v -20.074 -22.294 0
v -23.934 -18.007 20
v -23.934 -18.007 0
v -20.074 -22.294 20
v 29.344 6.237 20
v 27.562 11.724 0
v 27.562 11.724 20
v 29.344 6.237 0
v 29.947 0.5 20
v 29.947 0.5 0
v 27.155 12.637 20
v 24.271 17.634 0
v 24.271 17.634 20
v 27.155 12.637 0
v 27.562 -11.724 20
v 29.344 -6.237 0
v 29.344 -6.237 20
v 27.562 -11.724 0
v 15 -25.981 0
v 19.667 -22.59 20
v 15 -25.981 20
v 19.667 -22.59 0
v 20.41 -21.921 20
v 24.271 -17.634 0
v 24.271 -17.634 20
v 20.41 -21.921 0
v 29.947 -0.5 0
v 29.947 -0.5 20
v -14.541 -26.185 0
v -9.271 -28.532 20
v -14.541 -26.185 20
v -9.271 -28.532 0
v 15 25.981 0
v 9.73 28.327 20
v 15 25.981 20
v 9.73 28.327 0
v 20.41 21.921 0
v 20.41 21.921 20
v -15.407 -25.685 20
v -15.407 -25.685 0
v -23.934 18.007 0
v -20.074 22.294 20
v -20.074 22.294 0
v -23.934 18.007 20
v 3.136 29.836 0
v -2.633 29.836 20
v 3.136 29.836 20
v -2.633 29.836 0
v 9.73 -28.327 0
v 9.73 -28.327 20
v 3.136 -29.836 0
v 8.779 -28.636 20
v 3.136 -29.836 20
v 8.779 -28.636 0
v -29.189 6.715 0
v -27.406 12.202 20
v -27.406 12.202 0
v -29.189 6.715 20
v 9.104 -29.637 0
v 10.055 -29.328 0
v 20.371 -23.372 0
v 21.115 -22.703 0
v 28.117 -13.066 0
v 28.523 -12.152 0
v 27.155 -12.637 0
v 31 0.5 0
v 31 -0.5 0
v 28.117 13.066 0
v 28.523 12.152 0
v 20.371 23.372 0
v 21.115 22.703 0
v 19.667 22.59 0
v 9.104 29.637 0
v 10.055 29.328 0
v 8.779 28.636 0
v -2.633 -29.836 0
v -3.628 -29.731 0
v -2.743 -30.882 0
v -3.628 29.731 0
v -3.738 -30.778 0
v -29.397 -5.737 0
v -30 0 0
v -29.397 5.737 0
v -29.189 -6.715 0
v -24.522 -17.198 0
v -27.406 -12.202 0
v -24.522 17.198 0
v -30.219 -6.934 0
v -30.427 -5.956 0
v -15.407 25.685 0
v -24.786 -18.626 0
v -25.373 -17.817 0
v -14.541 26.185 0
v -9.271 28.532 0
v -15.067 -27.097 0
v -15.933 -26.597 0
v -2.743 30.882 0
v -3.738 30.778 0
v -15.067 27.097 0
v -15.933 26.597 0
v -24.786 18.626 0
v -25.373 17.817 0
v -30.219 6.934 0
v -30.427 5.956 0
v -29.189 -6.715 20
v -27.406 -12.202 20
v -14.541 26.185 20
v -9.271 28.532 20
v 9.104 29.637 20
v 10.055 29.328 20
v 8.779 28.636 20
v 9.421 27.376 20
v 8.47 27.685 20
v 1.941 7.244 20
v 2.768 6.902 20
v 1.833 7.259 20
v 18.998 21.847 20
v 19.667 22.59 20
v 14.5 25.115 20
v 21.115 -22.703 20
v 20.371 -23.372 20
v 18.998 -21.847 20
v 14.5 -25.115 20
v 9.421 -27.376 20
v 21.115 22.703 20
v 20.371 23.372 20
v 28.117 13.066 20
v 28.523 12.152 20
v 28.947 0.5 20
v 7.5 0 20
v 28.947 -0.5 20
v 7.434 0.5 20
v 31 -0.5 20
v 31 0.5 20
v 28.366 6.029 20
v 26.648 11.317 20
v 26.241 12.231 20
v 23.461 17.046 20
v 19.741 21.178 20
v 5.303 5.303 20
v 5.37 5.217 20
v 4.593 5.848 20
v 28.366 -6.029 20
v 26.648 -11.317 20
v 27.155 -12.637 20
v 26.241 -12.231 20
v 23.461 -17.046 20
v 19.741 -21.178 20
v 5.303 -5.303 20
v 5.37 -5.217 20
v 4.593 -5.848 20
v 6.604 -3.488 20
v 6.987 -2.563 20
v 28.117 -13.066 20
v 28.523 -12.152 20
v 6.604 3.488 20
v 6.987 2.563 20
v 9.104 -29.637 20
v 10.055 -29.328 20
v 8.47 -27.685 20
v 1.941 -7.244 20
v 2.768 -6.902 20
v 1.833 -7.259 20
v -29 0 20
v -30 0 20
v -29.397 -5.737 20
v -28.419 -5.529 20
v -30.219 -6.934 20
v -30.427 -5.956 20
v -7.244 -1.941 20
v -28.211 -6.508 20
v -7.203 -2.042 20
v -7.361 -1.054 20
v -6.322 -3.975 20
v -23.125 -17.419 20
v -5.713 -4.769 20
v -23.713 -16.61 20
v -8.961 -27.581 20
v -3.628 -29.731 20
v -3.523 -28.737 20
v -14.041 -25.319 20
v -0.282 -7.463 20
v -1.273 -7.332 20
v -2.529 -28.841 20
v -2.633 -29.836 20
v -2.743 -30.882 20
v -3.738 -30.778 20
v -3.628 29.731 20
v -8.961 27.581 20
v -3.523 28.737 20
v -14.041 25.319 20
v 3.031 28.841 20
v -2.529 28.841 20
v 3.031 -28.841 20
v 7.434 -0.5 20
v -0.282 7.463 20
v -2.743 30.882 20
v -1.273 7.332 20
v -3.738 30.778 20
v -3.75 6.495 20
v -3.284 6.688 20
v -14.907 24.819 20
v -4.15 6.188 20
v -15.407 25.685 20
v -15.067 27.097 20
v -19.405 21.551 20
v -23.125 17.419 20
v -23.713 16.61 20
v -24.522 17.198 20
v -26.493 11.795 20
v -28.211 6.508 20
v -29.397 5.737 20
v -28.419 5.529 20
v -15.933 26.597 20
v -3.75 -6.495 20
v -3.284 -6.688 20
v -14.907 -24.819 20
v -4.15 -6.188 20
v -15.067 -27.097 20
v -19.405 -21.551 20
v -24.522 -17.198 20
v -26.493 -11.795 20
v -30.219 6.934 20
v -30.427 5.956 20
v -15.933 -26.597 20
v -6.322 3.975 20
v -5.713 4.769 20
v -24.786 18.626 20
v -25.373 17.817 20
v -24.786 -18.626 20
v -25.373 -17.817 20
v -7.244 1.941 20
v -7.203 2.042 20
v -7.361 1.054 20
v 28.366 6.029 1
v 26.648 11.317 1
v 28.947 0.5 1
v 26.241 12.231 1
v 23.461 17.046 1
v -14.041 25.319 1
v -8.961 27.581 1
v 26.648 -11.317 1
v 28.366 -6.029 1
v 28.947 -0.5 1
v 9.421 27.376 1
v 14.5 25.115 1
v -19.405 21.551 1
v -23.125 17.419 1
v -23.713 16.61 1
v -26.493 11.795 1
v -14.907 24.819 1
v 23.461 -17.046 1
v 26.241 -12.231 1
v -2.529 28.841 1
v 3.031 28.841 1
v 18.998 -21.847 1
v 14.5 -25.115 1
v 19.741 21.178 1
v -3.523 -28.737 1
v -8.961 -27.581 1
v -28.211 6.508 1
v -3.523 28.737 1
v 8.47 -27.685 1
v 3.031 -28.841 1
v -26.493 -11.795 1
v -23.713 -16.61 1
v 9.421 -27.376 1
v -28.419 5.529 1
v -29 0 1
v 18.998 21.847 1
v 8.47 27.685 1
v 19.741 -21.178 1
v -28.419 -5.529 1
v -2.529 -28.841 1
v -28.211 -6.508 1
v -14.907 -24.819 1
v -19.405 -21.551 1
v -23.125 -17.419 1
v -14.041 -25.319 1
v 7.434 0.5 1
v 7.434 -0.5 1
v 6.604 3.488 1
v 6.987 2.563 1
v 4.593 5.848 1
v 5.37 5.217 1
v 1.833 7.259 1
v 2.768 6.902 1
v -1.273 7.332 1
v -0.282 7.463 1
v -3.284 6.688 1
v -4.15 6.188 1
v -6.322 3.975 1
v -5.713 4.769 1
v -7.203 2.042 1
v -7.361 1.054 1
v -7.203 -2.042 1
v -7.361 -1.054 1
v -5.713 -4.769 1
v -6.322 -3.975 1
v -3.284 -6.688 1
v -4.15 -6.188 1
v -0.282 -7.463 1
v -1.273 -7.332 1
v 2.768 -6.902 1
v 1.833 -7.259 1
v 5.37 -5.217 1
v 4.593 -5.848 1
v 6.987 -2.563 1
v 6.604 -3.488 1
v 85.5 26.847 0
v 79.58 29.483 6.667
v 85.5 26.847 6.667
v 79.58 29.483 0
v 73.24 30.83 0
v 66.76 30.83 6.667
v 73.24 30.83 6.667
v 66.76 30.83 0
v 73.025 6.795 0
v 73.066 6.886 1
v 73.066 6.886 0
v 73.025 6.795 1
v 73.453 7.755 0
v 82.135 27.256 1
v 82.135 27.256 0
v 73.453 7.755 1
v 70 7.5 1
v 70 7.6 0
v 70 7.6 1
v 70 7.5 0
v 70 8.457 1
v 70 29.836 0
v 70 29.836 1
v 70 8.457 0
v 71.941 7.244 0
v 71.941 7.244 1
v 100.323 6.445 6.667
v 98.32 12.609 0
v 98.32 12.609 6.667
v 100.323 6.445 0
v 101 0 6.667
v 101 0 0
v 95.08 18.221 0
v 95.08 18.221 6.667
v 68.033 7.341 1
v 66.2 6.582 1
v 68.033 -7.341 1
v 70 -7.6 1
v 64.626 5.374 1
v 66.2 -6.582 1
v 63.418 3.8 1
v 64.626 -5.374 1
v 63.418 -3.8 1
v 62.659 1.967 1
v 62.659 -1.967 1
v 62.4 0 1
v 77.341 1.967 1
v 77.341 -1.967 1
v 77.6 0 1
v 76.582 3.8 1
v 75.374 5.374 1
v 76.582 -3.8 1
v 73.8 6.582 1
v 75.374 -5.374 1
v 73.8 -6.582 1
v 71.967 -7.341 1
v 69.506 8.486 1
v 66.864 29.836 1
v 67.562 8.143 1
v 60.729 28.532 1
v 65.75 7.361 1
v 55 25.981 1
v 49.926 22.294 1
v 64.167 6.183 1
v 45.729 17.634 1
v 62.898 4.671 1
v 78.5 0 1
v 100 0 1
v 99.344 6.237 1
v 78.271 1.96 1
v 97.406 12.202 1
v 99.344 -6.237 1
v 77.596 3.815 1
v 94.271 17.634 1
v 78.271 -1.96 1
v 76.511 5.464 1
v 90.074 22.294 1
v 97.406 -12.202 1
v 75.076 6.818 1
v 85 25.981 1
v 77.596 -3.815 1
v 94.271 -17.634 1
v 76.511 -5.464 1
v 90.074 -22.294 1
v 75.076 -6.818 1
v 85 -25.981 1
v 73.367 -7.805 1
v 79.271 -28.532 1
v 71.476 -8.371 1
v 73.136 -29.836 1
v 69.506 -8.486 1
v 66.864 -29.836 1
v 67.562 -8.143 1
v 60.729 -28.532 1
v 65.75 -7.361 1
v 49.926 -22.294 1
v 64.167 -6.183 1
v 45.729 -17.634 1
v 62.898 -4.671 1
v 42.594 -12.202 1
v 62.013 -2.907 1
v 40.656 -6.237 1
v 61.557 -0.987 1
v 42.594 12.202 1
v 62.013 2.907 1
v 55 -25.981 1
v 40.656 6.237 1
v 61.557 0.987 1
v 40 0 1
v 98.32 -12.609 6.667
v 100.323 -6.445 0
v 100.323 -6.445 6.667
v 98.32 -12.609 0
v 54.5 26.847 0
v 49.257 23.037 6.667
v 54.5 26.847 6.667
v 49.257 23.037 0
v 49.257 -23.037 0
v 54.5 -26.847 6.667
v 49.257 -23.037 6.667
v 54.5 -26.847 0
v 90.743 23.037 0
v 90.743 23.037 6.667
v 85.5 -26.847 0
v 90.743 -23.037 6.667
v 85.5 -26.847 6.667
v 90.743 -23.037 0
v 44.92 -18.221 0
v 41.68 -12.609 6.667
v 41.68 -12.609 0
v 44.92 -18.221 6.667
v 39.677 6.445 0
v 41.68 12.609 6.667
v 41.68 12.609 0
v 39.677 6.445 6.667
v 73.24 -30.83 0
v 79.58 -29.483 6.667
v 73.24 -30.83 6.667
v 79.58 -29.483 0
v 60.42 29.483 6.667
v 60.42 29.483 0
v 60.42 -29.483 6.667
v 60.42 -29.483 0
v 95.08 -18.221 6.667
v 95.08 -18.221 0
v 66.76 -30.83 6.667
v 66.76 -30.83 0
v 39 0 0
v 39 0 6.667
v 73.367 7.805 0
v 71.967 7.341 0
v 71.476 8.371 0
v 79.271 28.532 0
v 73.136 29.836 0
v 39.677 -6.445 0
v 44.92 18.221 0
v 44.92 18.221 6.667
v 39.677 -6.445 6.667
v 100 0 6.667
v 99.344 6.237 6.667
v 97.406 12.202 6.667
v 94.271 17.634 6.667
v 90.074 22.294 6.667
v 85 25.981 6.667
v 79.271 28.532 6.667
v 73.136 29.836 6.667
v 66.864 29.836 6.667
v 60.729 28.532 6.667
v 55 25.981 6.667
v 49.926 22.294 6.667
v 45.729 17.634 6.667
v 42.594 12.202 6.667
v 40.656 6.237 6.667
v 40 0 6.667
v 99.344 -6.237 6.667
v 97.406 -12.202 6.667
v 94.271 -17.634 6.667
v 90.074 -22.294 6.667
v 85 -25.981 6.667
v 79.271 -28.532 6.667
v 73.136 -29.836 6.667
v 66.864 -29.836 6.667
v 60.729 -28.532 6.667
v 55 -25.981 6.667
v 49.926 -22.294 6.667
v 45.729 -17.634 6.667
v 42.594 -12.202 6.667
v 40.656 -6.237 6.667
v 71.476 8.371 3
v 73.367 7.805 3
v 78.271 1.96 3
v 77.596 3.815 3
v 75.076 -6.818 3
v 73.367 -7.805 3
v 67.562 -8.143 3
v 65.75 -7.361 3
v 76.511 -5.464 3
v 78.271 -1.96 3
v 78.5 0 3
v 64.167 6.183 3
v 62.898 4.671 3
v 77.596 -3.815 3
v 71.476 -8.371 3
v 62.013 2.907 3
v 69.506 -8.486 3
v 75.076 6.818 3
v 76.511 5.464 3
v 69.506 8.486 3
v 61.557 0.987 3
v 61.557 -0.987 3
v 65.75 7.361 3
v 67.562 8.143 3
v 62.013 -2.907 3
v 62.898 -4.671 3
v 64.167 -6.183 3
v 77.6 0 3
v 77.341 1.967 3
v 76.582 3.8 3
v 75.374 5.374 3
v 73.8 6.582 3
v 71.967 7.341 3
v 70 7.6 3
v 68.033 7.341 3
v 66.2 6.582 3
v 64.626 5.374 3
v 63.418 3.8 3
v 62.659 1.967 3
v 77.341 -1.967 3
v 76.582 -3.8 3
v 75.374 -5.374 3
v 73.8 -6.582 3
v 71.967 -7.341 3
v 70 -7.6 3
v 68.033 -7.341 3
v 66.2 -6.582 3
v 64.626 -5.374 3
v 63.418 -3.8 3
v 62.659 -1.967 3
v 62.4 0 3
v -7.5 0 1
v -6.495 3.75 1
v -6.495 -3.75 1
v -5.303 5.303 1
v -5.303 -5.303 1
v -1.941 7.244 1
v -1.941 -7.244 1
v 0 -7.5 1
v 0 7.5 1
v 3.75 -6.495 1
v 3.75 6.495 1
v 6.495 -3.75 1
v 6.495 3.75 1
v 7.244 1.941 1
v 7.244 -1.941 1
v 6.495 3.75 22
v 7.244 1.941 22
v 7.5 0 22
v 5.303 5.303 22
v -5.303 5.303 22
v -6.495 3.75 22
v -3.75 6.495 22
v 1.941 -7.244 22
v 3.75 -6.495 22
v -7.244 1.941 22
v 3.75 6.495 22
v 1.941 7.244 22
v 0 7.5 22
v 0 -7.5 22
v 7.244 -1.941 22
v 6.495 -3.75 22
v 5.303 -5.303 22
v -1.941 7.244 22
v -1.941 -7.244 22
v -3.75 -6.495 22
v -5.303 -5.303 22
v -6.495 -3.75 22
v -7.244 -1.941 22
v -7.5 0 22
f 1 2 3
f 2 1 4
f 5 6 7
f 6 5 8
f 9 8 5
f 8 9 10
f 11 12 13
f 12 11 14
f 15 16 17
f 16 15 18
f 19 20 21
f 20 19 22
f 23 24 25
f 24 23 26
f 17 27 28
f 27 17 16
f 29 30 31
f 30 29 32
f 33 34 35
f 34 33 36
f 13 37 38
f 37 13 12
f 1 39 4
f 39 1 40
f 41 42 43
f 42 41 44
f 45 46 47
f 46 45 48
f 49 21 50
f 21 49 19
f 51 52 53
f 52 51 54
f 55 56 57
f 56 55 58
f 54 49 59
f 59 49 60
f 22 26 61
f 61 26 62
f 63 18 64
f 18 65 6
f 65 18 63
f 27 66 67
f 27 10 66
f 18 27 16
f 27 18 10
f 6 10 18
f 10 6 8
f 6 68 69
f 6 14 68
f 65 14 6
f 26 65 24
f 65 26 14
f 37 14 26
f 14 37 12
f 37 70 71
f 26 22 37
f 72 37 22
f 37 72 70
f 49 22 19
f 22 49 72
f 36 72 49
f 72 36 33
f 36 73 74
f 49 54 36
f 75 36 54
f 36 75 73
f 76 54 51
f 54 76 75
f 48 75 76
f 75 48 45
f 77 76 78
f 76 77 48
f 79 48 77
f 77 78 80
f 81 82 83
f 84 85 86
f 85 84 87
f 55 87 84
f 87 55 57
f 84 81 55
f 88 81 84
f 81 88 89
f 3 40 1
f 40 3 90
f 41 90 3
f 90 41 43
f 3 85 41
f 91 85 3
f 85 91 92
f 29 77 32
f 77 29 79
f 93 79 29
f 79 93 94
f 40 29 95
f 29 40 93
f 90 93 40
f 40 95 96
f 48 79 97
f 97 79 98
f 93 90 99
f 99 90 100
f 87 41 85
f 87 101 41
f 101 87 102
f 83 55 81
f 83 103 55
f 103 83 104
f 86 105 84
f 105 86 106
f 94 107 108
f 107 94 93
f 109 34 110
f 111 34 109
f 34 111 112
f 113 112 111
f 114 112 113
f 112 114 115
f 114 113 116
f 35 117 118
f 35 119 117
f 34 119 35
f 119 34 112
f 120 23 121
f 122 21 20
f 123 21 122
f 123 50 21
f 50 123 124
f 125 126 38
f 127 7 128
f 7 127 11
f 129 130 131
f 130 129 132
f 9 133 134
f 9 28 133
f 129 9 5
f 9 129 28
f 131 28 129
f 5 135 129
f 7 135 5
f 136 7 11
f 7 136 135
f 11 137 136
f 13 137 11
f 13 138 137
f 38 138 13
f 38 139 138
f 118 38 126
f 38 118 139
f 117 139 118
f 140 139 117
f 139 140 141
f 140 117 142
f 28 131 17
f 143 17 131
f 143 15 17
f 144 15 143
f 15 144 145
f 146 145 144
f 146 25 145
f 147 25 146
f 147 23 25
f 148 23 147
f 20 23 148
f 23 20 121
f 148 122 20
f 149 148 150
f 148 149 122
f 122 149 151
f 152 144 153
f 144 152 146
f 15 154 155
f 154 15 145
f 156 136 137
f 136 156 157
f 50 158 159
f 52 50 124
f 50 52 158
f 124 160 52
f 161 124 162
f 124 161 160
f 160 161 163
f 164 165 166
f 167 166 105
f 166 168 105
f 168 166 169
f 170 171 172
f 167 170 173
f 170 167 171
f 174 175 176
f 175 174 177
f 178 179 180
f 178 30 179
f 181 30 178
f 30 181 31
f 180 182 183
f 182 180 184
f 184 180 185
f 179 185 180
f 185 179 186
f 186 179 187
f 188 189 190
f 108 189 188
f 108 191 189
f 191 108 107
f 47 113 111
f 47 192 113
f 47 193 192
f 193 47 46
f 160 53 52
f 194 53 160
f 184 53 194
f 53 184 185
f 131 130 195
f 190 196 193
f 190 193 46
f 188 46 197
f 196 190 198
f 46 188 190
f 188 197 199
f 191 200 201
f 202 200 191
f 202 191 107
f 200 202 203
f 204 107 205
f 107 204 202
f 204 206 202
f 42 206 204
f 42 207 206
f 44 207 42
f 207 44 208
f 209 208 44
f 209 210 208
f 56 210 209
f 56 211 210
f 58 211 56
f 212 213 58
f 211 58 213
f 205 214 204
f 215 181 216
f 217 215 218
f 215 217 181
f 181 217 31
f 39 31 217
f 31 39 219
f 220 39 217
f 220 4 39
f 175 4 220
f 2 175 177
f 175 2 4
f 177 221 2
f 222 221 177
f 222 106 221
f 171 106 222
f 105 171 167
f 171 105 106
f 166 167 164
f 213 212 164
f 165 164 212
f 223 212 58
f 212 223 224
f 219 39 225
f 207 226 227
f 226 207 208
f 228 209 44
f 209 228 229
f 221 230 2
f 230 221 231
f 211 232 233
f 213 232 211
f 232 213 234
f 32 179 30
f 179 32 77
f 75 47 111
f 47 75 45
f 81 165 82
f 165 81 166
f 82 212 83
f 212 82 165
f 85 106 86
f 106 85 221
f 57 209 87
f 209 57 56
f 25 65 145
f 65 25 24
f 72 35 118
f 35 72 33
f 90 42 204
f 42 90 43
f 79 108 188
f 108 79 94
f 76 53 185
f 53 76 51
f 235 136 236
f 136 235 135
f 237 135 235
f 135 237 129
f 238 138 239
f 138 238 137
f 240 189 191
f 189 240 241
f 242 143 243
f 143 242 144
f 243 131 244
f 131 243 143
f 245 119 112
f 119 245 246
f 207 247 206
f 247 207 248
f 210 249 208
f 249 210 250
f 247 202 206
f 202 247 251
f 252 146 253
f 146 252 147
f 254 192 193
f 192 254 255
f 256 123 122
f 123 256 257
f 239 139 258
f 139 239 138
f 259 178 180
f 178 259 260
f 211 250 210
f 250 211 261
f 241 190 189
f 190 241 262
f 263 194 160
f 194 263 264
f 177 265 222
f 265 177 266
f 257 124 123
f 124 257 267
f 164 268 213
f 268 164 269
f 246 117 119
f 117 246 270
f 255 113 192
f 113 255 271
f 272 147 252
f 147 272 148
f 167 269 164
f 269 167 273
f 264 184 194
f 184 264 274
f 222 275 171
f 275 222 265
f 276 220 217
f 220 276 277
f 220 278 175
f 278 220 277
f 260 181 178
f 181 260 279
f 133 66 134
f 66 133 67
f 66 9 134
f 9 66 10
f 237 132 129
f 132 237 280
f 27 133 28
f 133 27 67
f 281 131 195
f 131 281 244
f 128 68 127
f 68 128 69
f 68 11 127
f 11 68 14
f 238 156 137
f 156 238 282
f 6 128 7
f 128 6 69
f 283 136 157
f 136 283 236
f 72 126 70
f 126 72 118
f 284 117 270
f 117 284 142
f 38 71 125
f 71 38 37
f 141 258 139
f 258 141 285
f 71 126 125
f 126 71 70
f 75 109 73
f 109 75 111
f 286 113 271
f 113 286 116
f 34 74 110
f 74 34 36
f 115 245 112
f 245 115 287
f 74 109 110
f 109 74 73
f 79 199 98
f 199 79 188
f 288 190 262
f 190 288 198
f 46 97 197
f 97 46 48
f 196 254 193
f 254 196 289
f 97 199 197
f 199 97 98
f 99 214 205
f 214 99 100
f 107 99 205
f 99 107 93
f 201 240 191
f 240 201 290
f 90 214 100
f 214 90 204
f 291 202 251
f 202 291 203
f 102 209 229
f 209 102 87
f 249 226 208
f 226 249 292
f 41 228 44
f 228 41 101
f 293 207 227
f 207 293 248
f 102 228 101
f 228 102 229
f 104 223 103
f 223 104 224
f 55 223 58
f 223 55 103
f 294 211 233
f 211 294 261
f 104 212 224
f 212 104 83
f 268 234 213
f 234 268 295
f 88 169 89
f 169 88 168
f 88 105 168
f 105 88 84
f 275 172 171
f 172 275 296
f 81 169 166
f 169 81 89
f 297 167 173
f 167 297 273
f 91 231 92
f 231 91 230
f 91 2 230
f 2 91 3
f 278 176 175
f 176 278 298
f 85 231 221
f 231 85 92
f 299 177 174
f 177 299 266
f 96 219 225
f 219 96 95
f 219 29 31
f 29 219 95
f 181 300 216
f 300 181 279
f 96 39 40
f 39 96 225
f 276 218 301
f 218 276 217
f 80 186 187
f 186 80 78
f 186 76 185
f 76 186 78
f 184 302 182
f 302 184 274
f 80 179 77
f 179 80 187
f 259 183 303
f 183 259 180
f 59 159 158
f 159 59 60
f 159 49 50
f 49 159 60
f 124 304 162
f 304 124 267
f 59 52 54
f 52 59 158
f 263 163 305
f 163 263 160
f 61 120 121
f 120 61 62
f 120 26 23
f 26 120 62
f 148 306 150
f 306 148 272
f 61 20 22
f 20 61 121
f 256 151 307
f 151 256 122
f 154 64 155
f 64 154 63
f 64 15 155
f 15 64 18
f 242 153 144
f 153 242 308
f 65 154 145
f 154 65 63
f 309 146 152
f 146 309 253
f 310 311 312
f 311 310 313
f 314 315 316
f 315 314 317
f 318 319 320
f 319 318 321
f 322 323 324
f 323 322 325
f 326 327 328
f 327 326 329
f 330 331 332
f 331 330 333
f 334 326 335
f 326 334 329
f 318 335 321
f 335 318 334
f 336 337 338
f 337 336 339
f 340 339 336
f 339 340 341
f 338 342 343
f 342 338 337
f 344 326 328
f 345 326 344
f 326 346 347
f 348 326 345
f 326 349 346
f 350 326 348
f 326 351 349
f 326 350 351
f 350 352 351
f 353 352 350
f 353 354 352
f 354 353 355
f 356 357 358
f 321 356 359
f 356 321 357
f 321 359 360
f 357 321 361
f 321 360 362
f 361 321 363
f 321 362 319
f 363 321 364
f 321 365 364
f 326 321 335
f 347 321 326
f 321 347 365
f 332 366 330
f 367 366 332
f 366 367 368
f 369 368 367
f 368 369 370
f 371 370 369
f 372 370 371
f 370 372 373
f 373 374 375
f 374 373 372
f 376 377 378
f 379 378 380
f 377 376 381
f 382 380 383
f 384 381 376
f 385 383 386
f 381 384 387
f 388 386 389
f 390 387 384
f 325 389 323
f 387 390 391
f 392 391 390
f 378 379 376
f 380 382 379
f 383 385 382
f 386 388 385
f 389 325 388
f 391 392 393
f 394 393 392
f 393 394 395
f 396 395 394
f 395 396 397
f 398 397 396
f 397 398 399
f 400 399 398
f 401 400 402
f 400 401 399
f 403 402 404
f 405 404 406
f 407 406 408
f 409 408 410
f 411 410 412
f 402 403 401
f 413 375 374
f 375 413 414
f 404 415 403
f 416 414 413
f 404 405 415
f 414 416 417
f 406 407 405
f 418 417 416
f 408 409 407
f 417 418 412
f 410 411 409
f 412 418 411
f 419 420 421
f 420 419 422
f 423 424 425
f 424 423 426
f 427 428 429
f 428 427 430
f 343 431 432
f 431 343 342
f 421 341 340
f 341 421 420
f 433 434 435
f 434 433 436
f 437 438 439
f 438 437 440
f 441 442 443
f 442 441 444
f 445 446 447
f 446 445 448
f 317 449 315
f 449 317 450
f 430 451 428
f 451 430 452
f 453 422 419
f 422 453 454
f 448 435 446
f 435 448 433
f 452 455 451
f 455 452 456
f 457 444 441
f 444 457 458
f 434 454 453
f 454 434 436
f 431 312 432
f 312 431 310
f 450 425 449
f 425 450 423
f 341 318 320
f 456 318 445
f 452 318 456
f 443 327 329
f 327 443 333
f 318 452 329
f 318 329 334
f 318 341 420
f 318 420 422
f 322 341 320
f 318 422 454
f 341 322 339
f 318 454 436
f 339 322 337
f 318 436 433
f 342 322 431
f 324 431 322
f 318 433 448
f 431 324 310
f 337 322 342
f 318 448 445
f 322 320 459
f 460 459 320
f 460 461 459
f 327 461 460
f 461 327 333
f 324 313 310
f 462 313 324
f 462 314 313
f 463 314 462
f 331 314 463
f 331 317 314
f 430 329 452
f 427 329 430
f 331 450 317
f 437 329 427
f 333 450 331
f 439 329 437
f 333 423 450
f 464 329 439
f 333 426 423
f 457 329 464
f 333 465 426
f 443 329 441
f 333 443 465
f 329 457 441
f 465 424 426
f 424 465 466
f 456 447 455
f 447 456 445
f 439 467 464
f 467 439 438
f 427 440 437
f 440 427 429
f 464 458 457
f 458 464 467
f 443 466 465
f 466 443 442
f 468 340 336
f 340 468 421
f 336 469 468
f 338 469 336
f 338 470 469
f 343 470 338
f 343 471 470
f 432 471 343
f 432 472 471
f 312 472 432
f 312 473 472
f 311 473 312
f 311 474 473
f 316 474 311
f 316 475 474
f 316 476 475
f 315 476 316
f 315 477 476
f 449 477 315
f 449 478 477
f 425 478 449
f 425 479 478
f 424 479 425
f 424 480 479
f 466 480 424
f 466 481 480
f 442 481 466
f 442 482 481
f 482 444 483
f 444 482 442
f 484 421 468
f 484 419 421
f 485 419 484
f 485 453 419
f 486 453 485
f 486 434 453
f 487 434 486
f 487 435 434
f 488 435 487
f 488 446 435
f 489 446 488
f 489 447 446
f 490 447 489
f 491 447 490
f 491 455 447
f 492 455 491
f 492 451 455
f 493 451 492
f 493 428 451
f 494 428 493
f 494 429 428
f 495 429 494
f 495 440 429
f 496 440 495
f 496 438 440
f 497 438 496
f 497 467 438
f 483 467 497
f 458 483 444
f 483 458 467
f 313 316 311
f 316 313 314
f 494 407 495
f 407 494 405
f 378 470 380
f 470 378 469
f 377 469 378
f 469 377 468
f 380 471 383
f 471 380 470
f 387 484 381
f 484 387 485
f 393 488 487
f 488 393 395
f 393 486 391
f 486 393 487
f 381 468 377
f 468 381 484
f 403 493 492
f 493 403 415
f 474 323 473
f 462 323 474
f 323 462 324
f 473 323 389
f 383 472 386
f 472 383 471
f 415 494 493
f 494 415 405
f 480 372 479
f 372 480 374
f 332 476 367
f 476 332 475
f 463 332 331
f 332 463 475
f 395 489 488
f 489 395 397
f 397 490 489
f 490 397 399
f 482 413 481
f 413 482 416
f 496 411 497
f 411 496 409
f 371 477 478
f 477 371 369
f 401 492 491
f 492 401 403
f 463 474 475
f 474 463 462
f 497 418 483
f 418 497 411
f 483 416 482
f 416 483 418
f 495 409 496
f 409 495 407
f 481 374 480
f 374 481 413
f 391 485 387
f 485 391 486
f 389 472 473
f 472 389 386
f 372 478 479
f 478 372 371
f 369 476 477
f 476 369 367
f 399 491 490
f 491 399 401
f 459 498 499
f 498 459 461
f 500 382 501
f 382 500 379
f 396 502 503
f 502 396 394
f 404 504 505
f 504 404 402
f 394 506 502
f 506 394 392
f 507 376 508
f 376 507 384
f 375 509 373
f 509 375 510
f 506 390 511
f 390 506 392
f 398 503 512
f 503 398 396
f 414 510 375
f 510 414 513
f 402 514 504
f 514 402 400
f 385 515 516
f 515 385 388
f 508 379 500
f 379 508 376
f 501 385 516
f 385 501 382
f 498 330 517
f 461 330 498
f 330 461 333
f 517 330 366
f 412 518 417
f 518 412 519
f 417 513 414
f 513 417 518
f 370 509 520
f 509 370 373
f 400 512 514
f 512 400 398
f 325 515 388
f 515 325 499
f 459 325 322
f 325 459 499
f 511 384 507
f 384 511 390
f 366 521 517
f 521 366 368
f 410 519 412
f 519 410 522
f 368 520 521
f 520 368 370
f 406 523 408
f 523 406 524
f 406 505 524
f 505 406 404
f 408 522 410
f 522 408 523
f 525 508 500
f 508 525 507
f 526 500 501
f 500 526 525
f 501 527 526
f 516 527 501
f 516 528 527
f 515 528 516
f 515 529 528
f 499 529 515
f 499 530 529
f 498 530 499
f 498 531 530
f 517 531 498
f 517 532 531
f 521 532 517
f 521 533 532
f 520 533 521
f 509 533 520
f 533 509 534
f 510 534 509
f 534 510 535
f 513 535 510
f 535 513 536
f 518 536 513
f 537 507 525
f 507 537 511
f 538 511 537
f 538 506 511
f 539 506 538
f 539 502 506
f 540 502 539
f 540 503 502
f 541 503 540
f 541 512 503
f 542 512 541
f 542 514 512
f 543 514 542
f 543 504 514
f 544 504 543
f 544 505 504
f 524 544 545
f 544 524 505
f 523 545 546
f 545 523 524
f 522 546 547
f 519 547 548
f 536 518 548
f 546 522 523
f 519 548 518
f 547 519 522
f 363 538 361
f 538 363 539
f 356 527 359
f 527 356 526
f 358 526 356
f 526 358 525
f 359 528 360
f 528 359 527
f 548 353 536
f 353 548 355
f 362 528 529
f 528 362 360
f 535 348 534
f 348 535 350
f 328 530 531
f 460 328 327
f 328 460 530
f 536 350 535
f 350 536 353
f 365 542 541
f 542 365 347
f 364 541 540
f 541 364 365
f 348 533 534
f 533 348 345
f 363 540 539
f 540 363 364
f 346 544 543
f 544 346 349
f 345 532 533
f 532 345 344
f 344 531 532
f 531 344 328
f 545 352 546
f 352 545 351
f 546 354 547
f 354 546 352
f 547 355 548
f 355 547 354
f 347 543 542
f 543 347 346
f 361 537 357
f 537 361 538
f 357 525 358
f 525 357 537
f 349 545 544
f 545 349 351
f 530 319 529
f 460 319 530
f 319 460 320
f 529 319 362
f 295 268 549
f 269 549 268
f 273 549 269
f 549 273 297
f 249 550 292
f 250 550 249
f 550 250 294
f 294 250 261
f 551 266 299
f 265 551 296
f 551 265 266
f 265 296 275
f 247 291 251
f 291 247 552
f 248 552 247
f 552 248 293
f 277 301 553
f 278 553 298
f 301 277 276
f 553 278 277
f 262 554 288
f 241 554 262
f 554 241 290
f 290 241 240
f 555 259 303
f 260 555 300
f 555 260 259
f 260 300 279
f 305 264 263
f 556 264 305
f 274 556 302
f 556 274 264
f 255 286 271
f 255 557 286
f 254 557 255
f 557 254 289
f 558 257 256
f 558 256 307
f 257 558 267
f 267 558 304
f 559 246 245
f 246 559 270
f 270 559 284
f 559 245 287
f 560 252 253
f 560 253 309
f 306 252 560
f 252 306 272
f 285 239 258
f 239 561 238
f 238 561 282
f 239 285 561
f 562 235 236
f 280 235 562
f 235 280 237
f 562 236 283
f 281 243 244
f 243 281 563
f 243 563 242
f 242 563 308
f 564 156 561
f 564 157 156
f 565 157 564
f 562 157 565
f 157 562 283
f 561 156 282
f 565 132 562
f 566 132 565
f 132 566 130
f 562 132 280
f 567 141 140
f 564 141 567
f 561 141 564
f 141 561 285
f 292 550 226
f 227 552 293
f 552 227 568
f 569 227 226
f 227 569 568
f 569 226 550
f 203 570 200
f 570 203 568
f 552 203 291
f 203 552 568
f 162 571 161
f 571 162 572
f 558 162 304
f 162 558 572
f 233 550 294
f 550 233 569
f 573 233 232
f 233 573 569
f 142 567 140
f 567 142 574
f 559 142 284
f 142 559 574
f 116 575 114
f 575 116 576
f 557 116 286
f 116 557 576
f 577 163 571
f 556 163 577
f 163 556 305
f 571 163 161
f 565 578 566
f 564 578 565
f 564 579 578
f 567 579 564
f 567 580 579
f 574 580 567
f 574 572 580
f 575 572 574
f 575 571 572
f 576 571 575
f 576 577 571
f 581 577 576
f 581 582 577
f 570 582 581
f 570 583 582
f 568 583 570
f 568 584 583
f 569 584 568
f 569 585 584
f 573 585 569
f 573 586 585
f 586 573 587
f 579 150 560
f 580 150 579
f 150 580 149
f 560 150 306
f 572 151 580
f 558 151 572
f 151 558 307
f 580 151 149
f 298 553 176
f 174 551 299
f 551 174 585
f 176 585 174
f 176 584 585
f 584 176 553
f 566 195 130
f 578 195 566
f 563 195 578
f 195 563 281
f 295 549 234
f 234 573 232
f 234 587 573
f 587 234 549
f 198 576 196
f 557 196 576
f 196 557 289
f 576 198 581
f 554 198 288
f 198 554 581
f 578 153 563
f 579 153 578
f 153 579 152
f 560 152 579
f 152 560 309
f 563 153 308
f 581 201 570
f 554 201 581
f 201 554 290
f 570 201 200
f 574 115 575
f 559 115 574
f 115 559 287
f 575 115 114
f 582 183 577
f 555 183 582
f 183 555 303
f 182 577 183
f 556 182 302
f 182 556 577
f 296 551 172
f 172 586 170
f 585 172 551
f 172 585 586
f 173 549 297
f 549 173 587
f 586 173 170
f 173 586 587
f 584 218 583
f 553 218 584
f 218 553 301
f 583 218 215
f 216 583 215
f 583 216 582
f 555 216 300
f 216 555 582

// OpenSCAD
// Hopefully obvious parameters. Sizes in mm
radius = 30;
height = 20;
thickness = 1;
// Total number of segments
segments = 15;

segment_angle = 360 / segments;


// The bottom of the box
cylinder(h=thickness, r=radius);

// Centre Cylinder
cylinder(h=height+2, r=radius/4);

// The wall of the box
difference() { 
    cylinder(h=height, r=radius);
    cylinder(h=height+1, r=radius-thickness);
}

// The first segment divider


for (i = [0 : segments] ) {
    this_angle = segment_angle * i;
    rotate(this_angle) {
        translate([0, (thickness / 2) * -1, 0]) {
            cube([radius+1, thickness, height]);
        }
    }
}


// Lid part
translate([radius*2+10, 0, 0]) {
  
   difference () {
       // Base
       cylinder(h=thickness, r=radius+1);
           
       translate([0,0,-1]) {
       difference() {
           intersection() {
               cylinder(h=thickness+3, r=radius+1);
               linear_extrude(height=thickness+4) {
                   // Triangles are easier than circles no you shut up.
                   polygon([[0,0],[0,radius*2], [(radius*2)*tan(segment_angle), radius*2]]);
               }            };
           cylinder(h=thickness+5, r=radius/4);
       };
   }

    }

    // Outer rim
    difference() { 
        cylinder(h=height/3, r=radius+1);
        cylinder(h=height/3+1, r=radius+1-thickness);
    }
    // lid 'bearing'
    difference () {
        cylinder(h=thickness+2, r=(radius/4)+thickness);
        cylinder(h=thickness+3, r=(radius/4)+0.1);
    }
}

    
